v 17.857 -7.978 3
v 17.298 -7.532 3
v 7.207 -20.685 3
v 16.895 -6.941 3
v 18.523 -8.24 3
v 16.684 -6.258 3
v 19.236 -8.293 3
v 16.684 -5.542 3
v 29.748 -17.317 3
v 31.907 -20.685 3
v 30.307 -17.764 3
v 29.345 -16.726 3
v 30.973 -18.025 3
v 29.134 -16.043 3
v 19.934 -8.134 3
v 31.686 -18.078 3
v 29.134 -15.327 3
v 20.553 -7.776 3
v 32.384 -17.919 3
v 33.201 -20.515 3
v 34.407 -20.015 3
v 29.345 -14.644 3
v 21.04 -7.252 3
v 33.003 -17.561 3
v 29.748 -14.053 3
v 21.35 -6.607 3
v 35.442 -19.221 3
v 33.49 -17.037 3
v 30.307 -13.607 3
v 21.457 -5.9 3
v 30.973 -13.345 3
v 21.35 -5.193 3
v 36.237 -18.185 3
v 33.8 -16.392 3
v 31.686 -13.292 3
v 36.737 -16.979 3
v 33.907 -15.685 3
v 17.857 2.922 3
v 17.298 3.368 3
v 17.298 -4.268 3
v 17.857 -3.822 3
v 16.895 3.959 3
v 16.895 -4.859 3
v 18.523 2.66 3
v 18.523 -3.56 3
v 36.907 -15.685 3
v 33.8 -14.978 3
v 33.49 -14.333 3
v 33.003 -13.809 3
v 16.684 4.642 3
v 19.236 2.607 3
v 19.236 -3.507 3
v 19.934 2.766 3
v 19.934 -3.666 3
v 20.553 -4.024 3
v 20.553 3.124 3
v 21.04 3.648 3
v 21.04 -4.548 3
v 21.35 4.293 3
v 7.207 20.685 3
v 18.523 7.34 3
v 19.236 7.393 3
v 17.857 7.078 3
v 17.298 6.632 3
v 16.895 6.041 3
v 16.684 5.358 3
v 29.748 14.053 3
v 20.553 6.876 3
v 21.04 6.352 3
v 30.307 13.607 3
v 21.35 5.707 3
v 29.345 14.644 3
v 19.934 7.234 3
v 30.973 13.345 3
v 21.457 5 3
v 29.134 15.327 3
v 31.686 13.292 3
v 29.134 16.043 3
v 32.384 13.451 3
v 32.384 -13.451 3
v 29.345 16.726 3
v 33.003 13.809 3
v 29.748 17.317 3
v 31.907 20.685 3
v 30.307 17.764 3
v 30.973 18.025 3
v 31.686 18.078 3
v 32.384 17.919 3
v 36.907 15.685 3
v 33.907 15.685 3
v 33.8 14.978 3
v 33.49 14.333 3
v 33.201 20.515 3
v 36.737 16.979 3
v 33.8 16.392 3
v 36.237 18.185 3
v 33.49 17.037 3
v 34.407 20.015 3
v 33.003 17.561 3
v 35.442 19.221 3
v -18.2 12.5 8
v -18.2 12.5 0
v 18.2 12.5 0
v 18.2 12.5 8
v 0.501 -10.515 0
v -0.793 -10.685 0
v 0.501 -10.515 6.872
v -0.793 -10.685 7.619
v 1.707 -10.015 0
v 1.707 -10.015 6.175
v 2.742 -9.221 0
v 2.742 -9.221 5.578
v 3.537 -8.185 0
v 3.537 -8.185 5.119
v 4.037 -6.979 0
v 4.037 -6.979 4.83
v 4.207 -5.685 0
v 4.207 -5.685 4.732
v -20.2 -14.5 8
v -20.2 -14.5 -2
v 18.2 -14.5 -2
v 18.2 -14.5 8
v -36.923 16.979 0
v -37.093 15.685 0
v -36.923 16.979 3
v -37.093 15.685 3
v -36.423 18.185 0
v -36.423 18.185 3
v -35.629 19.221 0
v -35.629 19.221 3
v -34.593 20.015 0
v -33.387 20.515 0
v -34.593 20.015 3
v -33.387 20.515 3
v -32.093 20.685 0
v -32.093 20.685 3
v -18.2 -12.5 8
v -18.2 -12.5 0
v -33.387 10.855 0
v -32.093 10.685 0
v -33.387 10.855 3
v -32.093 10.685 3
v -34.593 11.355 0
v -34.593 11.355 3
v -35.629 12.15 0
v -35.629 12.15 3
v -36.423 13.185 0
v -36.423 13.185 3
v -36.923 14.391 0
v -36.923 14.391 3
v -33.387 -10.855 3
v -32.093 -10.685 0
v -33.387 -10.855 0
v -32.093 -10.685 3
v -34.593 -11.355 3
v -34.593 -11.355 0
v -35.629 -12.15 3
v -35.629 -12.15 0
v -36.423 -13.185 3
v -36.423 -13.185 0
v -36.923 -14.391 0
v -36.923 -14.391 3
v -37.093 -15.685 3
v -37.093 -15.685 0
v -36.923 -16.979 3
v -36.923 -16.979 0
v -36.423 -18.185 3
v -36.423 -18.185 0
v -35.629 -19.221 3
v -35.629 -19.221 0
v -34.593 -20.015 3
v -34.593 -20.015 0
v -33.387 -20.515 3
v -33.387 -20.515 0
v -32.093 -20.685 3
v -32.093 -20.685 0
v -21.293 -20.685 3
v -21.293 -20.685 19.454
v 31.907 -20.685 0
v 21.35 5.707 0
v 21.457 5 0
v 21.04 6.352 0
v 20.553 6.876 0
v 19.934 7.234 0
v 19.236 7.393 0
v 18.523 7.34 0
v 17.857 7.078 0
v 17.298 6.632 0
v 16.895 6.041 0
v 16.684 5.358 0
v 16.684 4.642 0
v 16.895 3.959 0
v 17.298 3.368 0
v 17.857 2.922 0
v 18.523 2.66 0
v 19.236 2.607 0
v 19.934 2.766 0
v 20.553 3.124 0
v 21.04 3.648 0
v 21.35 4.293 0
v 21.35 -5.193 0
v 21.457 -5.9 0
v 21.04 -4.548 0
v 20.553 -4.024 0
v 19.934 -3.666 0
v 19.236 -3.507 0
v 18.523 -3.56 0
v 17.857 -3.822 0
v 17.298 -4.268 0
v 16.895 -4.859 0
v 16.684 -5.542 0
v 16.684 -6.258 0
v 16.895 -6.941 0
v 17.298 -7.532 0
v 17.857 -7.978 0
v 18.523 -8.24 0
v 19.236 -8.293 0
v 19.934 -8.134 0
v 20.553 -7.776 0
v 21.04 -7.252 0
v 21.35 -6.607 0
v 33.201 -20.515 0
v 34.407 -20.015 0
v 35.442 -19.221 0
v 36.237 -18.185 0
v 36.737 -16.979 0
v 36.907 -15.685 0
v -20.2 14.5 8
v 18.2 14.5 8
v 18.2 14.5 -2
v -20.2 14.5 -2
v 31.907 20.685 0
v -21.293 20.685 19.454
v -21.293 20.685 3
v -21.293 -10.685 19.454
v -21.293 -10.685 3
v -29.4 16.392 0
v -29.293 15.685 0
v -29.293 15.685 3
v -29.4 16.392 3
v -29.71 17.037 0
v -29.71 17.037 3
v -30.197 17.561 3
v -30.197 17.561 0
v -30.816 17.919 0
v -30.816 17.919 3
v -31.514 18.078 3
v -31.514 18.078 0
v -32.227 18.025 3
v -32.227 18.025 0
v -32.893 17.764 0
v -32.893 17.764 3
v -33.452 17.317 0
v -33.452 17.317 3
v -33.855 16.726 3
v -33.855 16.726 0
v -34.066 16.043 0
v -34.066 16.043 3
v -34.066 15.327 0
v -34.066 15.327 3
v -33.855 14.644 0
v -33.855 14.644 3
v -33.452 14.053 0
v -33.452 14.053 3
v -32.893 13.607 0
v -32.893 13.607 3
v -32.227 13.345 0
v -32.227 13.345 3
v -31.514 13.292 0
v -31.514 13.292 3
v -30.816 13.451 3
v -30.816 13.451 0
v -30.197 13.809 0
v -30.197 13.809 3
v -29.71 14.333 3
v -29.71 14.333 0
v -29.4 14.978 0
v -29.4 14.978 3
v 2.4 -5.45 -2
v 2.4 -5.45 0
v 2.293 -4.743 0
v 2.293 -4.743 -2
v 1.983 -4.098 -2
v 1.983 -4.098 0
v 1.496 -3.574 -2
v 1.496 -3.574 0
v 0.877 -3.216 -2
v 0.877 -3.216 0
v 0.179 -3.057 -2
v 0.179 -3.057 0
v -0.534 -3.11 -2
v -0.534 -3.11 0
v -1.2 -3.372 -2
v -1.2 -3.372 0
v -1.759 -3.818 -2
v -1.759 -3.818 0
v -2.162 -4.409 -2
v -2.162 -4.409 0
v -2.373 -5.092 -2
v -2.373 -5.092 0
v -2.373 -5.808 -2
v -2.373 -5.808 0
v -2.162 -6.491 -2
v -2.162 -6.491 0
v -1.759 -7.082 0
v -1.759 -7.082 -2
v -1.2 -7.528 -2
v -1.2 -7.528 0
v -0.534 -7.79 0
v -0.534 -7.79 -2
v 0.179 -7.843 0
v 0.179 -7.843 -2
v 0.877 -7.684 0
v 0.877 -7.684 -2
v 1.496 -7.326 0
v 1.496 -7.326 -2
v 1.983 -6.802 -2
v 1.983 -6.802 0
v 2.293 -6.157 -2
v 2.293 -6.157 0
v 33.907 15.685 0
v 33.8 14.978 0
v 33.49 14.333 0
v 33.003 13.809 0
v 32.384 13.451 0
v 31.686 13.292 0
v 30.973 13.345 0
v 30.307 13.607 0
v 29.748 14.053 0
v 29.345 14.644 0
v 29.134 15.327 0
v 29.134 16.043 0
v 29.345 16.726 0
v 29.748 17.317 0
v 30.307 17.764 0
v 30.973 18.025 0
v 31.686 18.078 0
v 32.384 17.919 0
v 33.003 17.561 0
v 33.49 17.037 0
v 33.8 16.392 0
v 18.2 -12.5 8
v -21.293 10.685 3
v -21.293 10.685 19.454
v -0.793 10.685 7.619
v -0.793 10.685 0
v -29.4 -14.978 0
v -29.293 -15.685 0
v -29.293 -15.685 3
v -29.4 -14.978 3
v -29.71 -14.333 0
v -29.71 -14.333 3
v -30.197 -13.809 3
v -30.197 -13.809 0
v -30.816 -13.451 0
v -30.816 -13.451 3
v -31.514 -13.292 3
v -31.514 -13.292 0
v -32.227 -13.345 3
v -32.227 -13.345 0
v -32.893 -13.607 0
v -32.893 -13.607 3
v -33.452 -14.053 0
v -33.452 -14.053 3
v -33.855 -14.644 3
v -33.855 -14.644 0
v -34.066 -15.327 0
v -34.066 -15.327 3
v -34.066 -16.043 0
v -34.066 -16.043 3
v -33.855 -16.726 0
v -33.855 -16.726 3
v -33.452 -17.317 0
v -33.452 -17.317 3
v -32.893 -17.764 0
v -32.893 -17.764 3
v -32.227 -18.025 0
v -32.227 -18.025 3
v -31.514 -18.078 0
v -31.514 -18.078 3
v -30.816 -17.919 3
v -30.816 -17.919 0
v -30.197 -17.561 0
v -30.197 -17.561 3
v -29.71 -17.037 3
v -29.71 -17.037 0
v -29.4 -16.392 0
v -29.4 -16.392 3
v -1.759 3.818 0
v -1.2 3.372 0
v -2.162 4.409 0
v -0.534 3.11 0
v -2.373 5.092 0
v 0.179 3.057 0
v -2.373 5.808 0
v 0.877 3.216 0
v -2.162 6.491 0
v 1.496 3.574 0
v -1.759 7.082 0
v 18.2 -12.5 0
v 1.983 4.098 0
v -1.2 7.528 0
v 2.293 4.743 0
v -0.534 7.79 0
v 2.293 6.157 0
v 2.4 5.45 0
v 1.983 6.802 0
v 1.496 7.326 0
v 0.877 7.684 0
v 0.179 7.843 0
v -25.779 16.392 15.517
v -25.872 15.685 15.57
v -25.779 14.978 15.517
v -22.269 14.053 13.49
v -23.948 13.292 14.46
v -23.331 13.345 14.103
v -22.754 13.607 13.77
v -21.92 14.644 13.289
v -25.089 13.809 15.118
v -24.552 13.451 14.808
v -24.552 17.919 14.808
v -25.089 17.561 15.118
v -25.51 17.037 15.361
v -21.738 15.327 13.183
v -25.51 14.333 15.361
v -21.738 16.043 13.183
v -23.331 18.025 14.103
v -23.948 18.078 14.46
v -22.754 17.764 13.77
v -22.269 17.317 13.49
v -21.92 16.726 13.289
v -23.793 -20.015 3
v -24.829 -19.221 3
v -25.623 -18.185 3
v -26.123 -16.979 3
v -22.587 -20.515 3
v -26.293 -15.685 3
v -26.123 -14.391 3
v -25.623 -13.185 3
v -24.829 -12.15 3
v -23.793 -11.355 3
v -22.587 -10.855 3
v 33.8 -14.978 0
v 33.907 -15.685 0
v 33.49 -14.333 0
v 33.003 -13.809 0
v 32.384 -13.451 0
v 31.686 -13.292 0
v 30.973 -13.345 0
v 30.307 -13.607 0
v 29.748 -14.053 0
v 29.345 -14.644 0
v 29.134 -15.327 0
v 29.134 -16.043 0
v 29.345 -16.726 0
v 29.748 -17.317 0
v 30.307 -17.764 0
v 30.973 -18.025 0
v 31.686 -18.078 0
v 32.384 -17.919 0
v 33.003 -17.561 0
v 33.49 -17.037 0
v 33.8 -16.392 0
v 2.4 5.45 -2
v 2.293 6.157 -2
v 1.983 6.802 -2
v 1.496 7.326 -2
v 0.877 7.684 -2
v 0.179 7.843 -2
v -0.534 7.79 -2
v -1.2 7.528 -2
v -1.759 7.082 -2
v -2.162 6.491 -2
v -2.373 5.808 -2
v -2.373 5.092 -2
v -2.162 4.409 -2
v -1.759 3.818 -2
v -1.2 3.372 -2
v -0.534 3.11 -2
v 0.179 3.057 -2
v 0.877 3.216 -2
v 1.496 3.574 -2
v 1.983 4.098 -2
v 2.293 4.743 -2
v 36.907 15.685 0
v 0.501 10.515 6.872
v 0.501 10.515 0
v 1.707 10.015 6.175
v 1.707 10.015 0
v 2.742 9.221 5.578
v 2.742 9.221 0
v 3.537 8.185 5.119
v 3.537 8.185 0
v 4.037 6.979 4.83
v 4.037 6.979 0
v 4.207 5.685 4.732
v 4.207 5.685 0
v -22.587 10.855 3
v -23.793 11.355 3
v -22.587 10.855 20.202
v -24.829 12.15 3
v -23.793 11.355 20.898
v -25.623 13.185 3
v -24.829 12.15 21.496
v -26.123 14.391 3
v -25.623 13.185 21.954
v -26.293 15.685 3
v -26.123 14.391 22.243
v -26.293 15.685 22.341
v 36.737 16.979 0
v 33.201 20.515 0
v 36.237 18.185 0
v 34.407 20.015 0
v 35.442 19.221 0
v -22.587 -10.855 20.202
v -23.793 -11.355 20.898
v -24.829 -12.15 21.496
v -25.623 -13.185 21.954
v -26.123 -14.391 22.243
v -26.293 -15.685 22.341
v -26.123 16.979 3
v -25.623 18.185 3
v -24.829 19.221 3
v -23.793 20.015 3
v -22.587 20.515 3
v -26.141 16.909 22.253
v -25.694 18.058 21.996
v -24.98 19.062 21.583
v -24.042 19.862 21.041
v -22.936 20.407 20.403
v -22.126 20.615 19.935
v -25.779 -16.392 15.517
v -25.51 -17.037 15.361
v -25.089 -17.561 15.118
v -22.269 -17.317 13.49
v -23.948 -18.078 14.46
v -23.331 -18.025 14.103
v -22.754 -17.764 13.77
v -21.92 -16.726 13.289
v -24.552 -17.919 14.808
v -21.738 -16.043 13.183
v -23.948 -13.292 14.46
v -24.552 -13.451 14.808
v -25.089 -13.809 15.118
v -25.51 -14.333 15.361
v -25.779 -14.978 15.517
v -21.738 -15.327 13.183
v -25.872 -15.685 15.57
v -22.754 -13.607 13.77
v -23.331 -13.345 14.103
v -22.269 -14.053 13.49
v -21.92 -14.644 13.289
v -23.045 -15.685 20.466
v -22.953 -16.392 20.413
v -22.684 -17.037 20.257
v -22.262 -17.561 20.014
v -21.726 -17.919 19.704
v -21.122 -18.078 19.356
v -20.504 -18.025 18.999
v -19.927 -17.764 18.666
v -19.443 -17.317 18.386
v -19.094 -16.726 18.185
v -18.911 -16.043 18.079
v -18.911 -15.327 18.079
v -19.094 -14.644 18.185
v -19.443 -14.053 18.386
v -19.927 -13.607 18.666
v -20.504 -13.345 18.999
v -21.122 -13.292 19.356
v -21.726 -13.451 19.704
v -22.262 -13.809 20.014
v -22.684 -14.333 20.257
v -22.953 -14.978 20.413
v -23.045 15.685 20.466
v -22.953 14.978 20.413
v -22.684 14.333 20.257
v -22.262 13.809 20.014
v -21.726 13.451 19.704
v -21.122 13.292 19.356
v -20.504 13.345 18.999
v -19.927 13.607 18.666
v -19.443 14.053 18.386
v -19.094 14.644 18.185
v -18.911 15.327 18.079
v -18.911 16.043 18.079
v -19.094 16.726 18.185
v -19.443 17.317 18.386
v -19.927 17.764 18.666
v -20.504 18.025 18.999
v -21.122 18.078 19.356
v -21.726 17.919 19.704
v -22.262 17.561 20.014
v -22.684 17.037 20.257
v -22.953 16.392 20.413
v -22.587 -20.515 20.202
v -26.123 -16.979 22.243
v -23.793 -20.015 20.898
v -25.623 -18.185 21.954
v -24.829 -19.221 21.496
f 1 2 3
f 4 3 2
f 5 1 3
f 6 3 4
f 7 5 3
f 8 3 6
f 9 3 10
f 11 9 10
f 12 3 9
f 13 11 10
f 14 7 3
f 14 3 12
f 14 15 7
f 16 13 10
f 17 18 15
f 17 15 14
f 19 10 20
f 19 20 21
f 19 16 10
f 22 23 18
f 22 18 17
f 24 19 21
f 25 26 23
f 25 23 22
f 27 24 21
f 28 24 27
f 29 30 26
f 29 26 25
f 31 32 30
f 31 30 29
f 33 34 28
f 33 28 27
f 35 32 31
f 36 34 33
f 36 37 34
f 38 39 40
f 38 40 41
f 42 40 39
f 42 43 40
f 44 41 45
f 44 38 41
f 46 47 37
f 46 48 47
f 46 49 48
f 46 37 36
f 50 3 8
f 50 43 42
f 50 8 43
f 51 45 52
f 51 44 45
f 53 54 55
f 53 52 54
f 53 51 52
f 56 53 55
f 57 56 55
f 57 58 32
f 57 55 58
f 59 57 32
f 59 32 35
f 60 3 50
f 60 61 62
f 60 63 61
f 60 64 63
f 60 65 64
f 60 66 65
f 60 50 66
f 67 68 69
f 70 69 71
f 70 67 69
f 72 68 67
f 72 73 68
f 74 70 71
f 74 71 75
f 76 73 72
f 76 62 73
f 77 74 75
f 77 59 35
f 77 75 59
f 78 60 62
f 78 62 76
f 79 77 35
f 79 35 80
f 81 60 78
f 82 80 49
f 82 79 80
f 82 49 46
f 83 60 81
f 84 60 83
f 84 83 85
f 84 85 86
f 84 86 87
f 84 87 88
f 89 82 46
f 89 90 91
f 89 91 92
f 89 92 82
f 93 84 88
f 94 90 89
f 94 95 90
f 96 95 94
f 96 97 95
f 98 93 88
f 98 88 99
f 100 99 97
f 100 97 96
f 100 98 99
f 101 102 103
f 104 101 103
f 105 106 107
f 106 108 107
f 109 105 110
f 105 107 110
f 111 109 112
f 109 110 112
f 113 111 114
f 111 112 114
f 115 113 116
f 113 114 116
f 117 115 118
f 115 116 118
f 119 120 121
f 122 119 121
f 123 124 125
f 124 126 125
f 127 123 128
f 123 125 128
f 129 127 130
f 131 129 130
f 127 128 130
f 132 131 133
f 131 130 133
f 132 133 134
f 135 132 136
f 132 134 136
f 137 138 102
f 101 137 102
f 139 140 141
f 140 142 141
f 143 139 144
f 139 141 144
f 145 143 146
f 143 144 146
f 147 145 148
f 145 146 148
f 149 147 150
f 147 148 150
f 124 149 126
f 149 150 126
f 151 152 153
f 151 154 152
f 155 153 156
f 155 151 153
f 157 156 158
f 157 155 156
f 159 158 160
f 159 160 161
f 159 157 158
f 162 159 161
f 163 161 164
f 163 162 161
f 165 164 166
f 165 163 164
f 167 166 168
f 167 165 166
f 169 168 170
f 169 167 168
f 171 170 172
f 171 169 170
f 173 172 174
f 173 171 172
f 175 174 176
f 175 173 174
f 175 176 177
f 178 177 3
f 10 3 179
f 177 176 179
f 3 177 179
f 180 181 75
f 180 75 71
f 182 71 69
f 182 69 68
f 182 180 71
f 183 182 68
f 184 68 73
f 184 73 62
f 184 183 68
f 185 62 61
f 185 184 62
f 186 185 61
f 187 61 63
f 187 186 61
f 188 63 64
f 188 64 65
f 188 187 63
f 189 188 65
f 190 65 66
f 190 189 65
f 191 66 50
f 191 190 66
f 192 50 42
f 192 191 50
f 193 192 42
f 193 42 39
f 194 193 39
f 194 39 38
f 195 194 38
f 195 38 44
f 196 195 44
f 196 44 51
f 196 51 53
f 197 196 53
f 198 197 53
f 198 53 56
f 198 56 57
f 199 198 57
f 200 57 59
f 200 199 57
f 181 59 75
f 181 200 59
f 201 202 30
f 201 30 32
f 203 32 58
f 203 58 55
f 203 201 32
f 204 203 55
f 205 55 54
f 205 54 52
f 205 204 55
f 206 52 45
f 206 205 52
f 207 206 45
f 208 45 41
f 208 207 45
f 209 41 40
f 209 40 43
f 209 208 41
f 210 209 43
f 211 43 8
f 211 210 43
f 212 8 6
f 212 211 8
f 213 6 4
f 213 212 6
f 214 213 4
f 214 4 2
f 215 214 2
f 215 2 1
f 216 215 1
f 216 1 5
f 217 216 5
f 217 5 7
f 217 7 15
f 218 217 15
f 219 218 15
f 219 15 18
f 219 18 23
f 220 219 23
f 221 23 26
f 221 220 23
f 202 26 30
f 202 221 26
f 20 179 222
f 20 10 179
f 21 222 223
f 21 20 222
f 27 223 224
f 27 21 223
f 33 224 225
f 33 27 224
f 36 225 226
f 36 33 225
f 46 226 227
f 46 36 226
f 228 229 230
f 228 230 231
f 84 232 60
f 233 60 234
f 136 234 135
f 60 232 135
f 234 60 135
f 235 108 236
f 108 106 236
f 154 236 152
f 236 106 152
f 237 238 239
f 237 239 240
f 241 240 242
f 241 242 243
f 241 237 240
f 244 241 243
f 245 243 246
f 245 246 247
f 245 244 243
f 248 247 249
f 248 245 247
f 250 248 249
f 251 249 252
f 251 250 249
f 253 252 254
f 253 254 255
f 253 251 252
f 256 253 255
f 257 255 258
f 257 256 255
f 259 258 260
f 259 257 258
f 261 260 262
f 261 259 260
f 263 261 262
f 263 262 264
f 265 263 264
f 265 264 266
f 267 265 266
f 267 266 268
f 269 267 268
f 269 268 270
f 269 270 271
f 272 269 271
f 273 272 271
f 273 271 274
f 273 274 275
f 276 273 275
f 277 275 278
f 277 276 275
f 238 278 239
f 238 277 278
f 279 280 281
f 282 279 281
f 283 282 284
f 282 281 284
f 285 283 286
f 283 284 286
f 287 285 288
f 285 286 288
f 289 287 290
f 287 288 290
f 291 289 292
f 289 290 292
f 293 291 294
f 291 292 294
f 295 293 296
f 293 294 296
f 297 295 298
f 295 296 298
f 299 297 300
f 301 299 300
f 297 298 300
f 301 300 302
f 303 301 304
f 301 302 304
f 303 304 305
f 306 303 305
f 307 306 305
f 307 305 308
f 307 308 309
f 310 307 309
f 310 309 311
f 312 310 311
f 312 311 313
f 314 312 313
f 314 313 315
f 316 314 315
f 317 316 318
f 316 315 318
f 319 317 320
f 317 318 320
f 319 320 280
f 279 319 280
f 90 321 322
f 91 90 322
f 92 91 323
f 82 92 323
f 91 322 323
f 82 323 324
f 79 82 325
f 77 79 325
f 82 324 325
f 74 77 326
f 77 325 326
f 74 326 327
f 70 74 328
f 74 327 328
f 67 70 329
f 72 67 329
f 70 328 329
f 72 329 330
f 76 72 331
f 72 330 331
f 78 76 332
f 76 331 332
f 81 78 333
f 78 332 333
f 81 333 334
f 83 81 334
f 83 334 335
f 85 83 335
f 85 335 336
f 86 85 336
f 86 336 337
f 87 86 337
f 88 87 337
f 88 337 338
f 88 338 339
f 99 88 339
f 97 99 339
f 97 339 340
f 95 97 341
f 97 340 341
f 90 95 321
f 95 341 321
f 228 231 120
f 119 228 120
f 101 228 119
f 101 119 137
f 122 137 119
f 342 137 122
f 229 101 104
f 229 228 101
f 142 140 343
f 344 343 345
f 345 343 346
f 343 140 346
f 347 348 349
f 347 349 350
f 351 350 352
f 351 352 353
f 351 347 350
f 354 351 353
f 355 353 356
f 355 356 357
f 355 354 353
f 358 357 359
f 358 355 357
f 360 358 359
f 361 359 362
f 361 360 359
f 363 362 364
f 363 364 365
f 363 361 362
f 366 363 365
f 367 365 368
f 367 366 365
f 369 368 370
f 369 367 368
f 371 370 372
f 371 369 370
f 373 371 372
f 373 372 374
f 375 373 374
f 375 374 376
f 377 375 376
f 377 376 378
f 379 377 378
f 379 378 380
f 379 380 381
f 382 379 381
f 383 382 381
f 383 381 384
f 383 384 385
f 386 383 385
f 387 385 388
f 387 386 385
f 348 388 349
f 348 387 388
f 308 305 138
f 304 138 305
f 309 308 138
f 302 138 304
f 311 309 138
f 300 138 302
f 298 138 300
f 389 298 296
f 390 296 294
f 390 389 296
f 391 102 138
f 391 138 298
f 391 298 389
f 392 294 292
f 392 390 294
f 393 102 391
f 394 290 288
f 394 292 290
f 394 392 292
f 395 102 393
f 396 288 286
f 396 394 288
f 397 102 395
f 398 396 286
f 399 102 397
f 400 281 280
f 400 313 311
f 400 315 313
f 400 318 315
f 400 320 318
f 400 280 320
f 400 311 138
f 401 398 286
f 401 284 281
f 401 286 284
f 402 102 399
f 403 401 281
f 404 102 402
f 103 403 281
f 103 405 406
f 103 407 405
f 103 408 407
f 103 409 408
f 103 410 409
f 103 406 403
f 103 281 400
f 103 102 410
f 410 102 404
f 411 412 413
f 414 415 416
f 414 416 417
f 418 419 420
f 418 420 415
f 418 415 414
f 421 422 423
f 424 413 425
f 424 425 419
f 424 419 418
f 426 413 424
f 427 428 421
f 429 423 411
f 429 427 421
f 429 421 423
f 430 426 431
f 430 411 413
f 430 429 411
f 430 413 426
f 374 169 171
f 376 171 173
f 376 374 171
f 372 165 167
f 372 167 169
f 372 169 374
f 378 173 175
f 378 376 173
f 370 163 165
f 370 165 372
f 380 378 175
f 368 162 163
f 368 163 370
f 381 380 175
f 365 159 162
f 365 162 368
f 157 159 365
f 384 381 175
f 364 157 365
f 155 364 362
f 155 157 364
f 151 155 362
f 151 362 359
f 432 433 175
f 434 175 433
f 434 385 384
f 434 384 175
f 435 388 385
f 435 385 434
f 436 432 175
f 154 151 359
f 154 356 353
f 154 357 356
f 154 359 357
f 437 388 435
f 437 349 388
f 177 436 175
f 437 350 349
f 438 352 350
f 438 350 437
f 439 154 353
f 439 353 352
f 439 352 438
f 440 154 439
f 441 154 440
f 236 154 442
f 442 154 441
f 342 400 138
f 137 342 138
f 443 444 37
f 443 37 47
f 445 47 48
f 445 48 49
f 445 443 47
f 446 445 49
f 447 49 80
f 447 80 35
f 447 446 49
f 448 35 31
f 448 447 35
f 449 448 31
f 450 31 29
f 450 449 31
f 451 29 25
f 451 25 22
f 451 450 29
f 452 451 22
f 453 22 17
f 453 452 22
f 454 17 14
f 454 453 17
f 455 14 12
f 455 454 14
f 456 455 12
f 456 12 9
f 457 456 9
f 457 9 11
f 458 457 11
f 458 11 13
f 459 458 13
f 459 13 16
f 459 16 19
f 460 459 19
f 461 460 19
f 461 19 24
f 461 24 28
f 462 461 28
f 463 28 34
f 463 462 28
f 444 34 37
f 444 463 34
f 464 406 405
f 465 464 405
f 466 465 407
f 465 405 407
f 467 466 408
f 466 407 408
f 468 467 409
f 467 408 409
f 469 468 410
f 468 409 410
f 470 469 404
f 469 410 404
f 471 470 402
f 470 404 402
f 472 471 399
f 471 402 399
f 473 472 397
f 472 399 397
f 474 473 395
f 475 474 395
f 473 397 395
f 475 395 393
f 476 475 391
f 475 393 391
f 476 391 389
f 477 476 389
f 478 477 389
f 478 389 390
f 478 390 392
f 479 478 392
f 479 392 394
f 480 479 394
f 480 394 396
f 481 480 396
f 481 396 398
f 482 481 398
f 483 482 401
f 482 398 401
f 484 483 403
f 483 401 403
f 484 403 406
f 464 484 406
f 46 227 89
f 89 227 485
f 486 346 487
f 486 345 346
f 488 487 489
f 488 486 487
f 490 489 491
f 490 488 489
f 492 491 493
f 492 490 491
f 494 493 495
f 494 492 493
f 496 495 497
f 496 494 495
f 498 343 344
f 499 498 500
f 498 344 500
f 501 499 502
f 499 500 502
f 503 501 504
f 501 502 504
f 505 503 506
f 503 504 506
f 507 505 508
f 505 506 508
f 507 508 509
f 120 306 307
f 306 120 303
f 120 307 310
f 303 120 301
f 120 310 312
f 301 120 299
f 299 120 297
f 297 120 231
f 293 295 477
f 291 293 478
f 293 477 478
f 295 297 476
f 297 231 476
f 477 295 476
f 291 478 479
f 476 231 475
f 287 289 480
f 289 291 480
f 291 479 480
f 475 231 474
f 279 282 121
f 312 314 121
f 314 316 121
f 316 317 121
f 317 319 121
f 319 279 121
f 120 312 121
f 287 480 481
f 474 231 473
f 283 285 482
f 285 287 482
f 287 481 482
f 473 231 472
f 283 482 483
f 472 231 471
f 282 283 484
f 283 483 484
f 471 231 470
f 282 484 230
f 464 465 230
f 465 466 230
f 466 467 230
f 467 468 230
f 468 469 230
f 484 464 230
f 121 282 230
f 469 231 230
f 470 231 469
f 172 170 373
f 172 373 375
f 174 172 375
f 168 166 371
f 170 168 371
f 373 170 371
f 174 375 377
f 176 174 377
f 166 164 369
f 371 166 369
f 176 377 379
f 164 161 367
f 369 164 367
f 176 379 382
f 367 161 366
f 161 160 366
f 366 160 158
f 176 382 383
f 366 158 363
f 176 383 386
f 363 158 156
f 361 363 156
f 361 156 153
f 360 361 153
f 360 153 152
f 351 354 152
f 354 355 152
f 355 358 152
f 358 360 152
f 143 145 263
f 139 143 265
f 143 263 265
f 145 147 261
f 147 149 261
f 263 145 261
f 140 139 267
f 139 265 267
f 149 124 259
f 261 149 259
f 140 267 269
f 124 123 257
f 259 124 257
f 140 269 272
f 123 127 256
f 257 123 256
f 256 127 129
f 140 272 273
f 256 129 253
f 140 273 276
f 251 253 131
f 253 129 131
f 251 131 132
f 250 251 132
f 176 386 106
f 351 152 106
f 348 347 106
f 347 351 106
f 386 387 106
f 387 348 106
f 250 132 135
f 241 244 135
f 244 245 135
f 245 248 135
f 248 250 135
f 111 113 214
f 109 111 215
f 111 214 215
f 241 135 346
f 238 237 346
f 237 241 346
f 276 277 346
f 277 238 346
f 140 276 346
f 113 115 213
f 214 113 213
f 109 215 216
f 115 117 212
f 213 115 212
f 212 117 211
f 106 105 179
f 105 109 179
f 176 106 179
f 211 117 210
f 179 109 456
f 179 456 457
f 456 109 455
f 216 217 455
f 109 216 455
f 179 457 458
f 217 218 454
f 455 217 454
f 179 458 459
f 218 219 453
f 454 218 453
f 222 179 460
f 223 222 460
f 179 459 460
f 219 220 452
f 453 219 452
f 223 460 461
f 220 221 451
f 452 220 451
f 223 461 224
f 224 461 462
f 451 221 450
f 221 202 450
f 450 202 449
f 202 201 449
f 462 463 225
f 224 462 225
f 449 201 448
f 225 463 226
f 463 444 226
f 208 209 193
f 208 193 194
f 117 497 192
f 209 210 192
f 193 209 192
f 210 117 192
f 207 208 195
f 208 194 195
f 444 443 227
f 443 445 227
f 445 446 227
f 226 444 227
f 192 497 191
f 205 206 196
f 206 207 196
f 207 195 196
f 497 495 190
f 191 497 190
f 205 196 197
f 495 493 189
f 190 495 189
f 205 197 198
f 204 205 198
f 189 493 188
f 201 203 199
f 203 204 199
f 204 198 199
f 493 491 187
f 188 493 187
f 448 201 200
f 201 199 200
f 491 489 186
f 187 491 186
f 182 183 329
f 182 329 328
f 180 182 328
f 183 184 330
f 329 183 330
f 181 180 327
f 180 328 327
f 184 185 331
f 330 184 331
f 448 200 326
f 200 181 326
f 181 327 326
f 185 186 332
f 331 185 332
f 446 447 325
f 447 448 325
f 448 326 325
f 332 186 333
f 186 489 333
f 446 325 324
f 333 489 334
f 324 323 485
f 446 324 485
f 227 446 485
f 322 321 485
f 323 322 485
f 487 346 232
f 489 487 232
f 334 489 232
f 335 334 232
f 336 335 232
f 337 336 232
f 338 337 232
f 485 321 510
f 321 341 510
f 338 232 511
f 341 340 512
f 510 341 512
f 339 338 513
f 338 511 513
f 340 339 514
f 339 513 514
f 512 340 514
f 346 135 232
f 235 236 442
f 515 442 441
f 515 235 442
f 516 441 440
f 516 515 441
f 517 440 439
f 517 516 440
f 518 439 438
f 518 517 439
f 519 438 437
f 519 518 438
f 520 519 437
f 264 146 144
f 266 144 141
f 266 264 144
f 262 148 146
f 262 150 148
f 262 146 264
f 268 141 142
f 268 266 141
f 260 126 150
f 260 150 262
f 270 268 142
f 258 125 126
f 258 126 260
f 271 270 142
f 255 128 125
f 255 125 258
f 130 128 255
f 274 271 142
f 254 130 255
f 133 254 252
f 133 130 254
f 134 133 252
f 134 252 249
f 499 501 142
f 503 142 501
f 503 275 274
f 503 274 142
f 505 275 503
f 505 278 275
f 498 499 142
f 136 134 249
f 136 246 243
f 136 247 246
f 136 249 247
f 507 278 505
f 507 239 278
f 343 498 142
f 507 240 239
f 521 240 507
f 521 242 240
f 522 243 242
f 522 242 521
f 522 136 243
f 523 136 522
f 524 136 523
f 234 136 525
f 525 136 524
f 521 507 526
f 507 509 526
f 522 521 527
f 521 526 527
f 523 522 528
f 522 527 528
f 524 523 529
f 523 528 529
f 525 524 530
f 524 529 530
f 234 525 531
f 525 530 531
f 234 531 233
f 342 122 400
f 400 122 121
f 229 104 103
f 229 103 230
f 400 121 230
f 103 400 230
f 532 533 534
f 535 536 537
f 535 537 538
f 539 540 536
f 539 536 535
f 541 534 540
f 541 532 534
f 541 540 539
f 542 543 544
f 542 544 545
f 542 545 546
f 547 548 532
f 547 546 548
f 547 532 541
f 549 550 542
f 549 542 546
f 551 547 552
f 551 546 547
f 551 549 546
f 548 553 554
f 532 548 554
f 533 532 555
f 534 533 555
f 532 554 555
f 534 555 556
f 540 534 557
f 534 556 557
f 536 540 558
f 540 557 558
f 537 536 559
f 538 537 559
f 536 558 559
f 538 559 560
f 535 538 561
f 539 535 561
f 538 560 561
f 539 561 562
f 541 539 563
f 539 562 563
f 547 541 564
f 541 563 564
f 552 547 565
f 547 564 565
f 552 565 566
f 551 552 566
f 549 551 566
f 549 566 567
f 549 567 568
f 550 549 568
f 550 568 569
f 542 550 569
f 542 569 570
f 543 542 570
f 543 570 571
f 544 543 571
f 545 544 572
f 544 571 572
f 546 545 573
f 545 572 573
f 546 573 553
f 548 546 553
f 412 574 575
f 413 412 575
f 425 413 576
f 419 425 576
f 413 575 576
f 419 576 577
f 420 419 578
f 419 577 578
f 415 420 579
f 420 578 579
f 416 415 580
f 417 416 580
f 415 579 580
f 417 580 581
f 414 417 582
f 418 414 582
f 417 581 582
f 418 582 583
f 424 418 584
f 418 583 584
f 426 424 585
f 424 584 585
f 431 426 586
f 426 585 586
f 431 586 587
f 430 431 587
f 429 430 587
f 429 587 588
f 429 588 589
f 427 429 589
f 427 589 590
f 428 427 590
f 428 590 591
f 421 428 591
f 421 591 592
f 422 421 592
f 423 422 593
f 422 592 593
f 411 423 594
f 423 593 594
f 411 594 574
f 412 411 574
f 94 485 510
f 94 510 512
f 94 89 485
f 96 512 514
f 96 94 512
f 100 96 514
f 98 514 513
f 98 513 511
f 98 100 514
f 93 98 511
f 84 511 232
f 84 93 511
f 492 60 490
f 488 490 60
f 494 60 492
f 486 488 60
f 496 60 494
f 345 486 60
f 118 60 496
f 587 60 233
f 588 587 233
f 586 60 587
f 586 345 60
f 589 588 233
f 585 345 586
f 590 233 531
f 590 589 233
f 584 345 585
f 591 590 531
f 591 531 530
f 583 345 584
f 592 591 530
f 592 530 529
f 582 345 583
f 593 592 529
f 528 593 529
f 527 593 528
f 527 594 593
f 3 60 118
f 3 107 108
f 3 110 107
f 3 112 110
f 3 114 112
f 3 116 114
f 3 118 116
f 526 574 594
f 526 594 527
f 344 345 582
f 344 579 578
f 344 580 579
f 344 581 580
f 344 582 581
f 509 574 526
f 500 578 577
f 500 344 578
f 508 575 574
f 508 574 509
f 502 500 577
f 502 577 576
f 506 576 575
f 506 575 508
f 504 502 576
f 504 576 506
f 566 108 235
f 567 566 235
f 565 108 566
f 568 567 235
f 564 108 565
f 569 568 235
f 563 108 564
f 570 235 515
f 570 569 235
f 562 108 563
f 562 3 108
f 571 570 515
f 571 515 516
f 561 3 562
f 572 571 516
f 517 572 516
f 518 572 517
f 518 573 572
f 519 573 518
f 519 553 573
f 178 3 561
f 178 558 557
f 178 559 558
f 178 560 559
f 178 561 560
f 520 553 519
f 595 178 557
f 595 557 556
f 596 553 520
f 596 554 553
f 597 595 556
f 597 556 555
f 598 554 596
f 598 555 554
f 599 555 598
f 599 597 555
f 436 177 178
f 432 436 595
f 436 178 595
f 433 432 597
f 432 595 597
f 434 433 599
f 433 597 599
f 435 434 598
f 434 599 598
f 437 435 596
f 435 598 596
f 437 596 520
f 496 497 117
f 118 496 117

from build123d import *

# Parameters (mm, degrees)
F0_W        = 3
F0_H        = 5
F1_DEPTH    = 25
F0_R        = 2.4
F2_DEPTH    = 3
F3_T4_DEPTH = 238.5325445422
F4_R        = 4.99999
F5_R        = 4.99999
F6_R        = 5
F8_DEPTH    = 5
F9_ANGLE    = -30
F10_ANGLE   = -30
F7_W        = 36.4
F7_H        = 25
F7_R        = 4.4
F7_R_2      = 2.4
F13_DEPTH   = 2
F14_DEPTH   = 8


# Not quite as in the source:
# - a fillet or chamfer that OpenCascade refuses, or shapes differently, is made with other operations: its cross-section is extruded or revolved along the edge and cut away or added
# - a fillet or chamfer is up to 0.001 mm smaller than in the source, because OpenCascade refuses the exact size


with BuildPart() as f1:
    # F0 (on Top) → F1 (new body)
    with BuildSketch(Plane.XY):
        Polygon((-26.2931033156, 20.6850649182), (-26.2931033156, 15.6850649182), (-26.2931033156, 10.6850649182), (4.2068966844, 10.6850649182), (4.2068966844, 15.6850649182), (4.2068966844, 20.6850649182), align=None)
        with BuildLine():
            ThreePointArc((-18.8931033156, 15.6850649182), (-21.2931033156, 13.2850649182), (-23.6931033156, 15.6850649182))
            ThreePointArc((-23.6931033156, 15.6850649182), (-21.2931033156, 18.0850649182), (-18.8931033156, 15.6850649182))
        make_face(mode=Mode.SUBTRACT)
        Polygon((4.2068966844, -20.6850649182), (4.2068966844, -10.6850649182), (-26.2931033156, -10.6850649182), (-26.2931033156, -15.6850649182), (-26.2931033156, -20.6850649182), align=None)
        with BuildLine():
            ThreePointArc((-18.8931033156, -15.6850649182), (-21.2931033156, -18.0850649182), (-23.6931033156, -15.6850649182))
            ThreePointArc((-23.6931033156, -15.6850649182), (-21.2931033156, -13.2850649182), (-18.8931033156, -15.6850649182))
        make_face(mode=Mode.SUBTRACT)
        Polygon((4.2068966844, 15.6850649182), (4.2068966844, 10.6850649182), (4.2068966844, -10.6850649182), (4.2068966844, -20.6850649182), (7.2068966844, -20.6850649182), (7.2068966844, 15.6850649182), align=None)
        with BuildLine():
            ThreePointArc((-18.8931033156, 15.6850649182), (-21.2931033156, 18.0850649182), (-23.6931033156, 15.6850649182))
            ThreePointArc((-23.6931033156, 15.6850649182), (-21.2931033156, 13.2850649182), (-18.8931033156, 15.6850649182))
        make_face()
        with BuildLine():
            ThreePointArc((-18.8931033156, -15.6850649182), (-21.2931033156, -13.2850649182), (-23.6931033156, -15.6850649182))
            ThreePointArc((-23.6931033156, -15.6850649182), (-21.2931033156, -18.0850649182), (-18.8931033156, -15.6850649182))
        make_face()
        with Locations((5.7068966844, 18.1850649182)):
            Rectangle(F0_W, F0_H)
    extrude(amount=F1_DEPTH)

    # F0 (on Top) → F2 (join)
    with BuildSketch(Plane.XY):
        Polygon((-26.2931033156, 10.6850649182), (-26.2931033156, 15.6850649182), (-26.2931033156, 20.6850649182), (-37.0931033156, 20.6850649182), (-37.0931033156, 10.6850649182), align=None)
        with Locations((-31.6931033156, 15.6850649182)):
            Circle(F0_R, mode=Mode.SUBTRACT)
        Polygon((-26.2931033156, -15.6850649182), (-26.2931033156, -10.6850649182), (-37.0931033156, -10.6850649182), (-37.0931033156, -20.6850649182), (-26.2931033156, -20.6850649182), align=None)
        with Locations((-31.6931033156, -15.6850649182)):
            Circle(F0_R, mode=Mode.SUBTRACT)
        Polygon((36.9068966844, 20.6850649182), (7.2068966844, 20.6850649182), (7.2068966844, 15.6850649182), (7.2068966844, -20.6850649182), (36.9068966844, -20.6850649182), align=None)
        with Locations((31.5068966844, -15.6850649182)):
            Circle(F0_R, mode=Mode.SUBTRACT)
        with Locations((19.0568966844, -5.9)):
            Circle(F0_R, mode=Mode.SUBTRACT)
        with Locations((19.0568966844, 5)):
            Circle(F0_R, mode=Mode.SUBTRACT)
        with BuildLine():
            ThreePointArc((29.1068966844, 15.6850649182), (31.5068966844, 18.0850649182), (33.9068966844, 15.6850649182))
            ThreePointArc((33.9068966844, 15.6850649182), (31.5068966844, 13.2850649182), (29.1068966844, 15.6850649182))
        make_face(mode=Mode.SUBTRACT)
    extrude(amount=F2_DEPTH)

    # F3: chamfer of 22 x 38.1051177665 on 1 edges, made by hand


with BuildPart() as f3_tool2:
    # F3_s3 → F3_t4 (new body)
    with BuildSketch(Plane.XZ.offset(119.2662722711)):
        Polygon((7.2068966844, 3), (-30.8982210821, 25), (7.2068966844, 25), align=None)
    extrude(amount=-F3_T4_DEPTH)

    split(bisect_by=Plane.XY.offset(3), keep=Keep.TOP)


with BuildPart() as f1_1:
    add(f1.part)

    # F3_t1: cut F3_tool2
    add(f3_tool2.part, mode=Mode.SUBTRACT)

    # F4 (radius 5 in the source; OpenCascade refuses exactly that, so slightly less here)
    f4_edges = [f1_1.edges().sort_by_distance(p)[0] for p in [
        (-37.093103, 20.685065, 1.5),
        (-37.093103, 10.685065, 1.5),
        (-37.093103, -10.685065, 1.5),
        (-37.093103, -20.685065, 1.5),
        (36.906897, -20.685065, 1.5),
        (36.906897, 20.685065, 1.5),
    ]]
    fillet(f4_edges, radius=F4_R)

    # F5 (radius 5 in the source; OpenCascade refuses exactly that, so slightly less here)
    f5_edges = [f1_1.edges().sort_by_distance(p)[0] for p in [
        (-26.293103, 20.685065, 12.670617),
        (-26.293103, 10.685065, 12.670617),
        (-26.293103, -10.685065, 12.670617),
        (-26.293103, -20.685065, 12.670617),
    ]]
    fillet(f5_edges, radius=F5_R)

    # F6
    f6_edges = [f1_1.edges().sort_by_distance(p)[0] for p in [
        (4.206897, 10.685065, 2.366025),
        (4.206897, -10.685065, 2.366025),
    ]]
    fillet(f6_edges, radius=F6_R)


with BuildPart() as f8:
    # F0 (on Top) → F8 (new body, symmetric)
    with BuildSketch(Plane.XY):
        with BuildLine():
            ThreePointArc((-18.8931033156, 15.6850649182), (-21.2931033156, 18.0850649182), (-23.6931033156, 15.6850649182))
            ThreePointArc((-23.6931033156, 15.6850649182), (-21.2931033156, 13.2850649182), (-18.8931033156, 15.6850649182))
        make_face()
    extrude(amount=F8_DEPTH, both=True)


with BuildPart() as f8b:
    # F0 (on Top) → F8, piece 2 (new body, symmetric)
    with BuildSketch(Plane.XY):
        with BuildLine():
            ThreePointArc((-18.8931033156, -15.6850649182), (-21.2931033156, -13.2850649182), (-23.6931033156, -15.6850649182))
            ThreePointArc((-23.6931033156, -15.6850649182), (-21.2931033156, -18.0850649182), (-18.8931033156, -15.6850649182))
        make_face()
    extrude(amount=F8_DEPTH, both=True)


with BuildPart() as f8b_1:
    # F9: moved
    add(f8b.part.rotate(Axis((-21.2931033156, -15.6850649182, 0), (0, -1, 0)), F9_ANGLE))


with BuildPart() as f8_1:
    # F10: moved
    add(f8.part.rotate(Axis((-21.2931033156, 15.6850649182, 0), (0, -1, 0)), F10_ANGLE))


with BuildPart() as f8b_2:
    # F11: moved
    add(f8b_1.part.moved(Location((0, 0, 18.7))))


with BuildPart() as f8_2:
    # F11: moved
    add(f8_1.part.moved(Location((0, 0, 18.7))))


with BuildPart() as f1_2:
    add(f1_1.part)

    # F12: cut F8, F8b
    add(f8_2.part, mode=Mode.SUBTRACT)
    add(f8b_2.part, mode=Mode.SUBTRACT)


with BuildPart() as f13:
    # F7 (on Top) → F13 (new body)
    with BuildSketch(Plane.XY):
        Polygon((18.2, -14.5), (18.2, -12.5), (-18.2, -12.5), (-18.2, 12.5), (18.2, 12.5), (18.2, 14.5), (-20.2, 14.5), (-20.2, -14.5), align=None)
        Rectangle(F7_W, F7_H)
        with Locations((0, -5.45)):
            Circle(F7_R, mode=Mode.SUBTRACT)
        with Locations((0, 5.45)):
            Circle(F7_R, mode=Mode.SUBTRACT)
        with Locations((0, 5.45)):
            Circle(F7_R)
        with Locations((0, 5.45)):
            Circle(F7_R_2, mode=Mode.SUBTRACT)
        with Locations((0, -5.45)):
            Circle(F7_R)
        with Locations((0, -5.45)):
            Circle(F7_R_2, mode=Mode.SUBTRACT)
    extrude(amount=-F13_DEPTH)

    # F7 (on Top) → F14 (join)
    with BuildSketch(Plane.XY):
        Polygon((18.2, -14.5), (18.2, -12.5), (-18.2, -12.5), (-18.2, 12.5), (18.2, 12.5), (18.2, 14.5), (-20.2, 14.5), (-20.2, -14.5), align=None)
    extrude(amount=F14_DEPTH)


solid = Compound([f1_2.part, f13.part])
